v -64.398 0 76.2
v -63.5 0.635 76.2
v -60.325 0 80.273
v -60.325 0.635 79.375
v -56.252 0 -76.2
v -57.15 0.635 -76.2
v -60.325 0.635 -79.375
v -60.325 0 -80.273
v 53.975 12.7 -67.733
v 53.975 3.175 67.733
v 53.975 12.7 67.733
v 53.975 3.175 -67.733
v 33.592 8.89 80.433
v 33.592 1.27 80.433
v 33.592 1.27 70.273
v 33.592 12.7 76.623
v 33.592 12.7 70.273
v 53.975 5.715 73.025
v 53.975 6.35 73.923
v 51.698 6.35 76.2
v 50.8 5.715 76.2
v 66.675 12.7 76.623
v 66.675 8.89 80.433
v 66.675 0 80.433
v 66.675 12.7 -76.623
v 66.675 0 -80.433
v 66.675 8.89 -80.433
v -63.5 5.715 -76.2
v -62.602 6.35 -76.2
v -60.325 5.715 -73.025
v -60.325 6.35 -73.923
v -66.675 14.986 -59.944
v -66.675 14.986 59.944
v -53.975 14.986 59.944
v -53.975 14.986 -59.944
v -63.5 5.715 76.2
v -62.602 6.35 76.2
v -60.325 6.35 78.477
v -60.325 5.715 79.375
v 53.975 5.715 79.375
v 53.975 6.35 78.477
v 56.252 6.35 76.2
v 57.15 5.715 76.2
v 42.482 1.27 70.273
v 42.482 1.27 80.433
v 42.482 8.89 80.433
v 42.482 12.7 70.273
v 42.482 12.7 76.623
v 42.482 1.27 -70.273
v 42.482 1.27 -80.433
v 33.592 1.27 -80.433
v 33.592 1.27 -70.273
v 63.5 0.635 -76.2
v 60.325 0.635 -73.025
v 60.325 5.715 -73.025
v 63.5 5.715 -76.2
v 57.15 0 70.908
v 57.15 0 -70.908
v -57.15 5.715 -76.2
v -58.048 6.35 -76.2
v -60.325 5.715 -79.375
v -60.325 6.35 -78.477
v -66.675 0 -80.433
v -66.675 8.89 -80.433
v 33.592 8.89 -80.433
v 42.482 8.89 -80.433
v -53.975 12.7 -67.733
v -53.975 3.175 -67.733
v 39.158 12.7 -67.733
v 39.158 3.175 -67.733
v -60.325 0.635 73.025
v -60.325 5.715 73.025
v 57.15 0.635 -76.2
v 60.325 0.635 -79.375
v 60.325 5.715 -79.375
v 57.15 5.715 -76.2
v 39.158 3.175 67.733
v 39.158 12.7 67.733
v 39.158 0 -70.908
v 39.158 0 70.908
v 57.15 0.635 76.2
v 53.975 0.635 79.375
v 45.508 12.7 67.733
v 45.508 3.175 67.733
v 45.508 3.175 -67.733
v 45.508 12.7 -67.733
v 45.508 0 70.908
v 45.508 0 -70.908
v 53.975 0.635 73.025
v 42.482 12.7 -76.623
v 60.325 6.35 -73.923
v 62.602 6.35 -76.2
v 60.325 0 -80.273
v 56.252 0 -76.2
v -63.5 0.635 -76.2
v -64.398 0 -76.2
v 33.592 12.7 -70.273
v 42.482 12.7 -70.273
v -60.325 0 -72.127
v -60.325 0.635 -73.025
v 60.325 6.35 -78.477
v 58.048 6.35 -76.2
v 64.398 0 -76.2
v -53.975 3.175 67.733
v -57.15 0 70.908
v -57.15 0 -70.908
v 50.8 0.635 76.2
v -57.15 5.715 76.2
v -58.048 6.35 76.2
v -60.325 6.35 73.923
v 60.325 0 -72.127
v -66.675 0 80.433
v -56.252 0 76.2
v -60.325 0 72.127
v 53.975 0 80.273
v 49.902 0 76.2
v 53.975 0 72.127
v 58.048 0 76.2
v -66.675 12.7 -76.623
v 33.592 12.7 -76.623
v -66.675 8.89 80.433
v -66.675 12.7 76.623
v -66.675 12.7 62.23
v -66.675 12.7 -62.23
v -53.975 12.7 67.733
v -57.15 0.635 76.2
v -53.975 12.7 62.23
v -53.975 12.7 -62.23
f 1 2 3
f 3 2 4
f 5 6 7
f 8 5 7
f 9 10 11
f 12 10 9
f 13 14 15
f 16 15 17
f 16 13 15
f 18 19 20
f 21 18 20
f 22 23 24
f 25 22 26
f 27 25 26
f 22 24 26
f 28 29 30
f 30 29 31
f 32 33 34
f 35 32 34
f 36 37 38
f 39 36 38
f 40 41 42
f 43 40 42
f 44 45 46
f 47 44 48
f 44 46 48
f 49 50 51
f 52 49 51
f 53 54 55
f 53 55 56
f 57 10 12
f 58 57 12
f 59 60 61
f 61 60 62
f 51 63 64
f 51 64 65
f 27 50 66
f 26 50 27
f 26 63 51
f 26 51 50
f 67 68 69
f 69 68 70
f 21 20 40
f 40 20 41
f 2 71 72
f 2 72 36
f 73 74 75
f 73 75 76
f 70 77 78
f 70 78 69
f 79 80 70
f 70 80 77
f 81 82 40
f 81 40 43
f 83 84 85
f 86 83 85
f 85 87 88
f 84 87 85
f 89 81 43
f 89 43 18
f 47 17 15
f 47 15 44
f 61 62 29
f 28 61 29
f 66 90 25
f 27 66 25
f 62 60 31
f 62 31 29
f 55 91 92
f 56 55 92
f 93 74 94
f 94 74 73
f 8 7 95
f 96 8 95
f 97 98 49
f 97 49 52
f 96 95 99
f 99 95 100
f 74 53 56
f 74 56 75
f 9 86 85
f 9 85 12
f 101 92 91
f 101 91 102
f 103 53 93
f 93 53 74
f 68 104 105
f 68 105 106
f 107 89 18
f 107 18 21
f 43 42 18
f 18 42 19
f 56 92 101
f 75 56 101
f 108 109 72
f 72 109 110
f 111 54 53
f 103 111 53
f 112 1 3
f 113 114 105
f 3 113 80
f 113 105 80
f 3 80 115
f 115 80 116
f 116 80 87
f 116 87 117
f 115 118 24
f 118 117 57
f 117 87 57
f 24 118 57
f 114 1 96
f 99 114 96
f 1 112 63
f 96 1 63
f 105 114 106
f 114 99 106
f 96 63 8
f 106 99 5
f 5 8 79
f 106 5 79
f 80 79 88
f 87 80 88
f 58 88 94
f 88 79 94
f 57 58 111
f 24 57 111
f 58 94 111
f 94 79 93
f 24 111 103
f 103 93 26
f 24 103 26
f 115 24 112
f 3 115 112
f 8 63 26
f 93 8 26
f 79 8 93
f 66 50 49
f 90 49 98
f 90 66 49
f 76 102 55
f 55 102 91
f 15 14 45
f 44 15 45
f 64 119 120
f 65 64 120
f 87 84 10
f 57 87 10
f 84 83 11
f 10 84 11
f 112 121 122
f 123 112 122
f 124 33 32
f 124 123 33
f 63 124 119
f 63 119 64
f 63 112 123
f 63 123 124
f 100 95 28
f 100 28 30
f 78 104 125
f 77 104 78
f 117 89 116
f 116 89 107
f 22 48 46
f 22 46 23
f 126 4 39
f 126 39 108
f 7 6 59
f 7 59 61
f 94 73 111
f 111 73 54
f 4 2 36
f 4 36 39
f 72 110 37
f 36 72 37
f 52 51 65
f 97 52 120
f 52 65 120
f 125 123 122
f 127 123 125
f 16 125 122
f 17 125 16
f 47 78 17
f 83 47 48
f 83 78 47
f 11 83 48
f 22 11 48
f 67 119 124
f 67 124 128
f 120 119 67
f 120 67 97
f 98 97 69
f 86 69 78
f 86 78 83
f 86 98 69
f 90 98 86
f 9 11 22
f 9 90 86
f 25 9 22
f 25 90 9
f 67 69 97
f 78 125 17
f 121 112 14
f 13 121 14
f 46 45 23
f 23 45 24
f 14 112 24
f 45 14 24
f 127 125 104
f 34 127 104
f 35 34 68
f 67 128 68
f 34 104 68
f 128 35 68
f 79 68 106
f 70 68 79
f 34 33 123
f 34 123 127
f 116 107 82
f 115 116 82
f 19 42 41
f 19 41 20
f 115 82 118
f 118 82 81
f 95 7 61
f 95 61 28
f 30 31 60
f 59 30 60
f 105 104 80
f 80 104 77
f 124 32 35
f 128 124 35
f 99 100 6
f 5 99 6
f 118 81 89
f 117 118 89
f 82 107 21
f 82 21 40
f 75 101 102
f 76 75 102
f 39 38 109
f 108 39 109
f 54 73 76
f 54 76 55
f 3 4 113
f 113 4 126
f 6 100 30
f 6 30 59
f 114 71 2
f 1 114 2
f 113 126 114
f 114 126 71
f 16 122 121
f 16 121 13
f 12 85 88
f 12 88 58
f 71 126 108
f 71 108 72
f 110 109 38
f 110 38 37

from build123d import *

# Parameters (mm, degrees)
SKETCH2_W           = 133.35
SKETCH2_H           = 160.866666666
SKETCH2_W_2         = 93.133333333
SKETCH2_H_2         = 135.466666666
SKETCH2_W_3         = 8.466666667
BOSS_EXTRUDE1_DEPTH = 12.7
CUT_EXTRUDE1_DEPTH  = 6.35
CHAMFER4_SIZE       = 3.81
CHAMFER1_SIZE       = 0.635
CHAMFER2_SIZE       = 3.175
SKETCH4_W           = 8.89
SKETCH4_H           = 11.43
CUT_EXTRUDE2_DEPTH  = 10.16
SKETCH5_W           = 8.89
SKETCH5_H           = 11.43
CUT_EXTRUDE3_DEPTH  = 10.16
SKETCH6_W           = 12.7
SKETCH6_H           = 124.46
BOSS_EXTRUDE2_DEPTH = 2.286
CHAMFER5_SIZE       = 2.286


with BuildPart() as part:
    # Sketch2 → Boss-Extrude1 (new body)
    with BuildSketch(Plane(origin=(0, 0, 0), x_dir=(1, 0, 0), z_dir=(0, 1, 0))):
        Rectangle(SKETCH2_W, SKETCH2_H)
        with Locations((-7.408333333, 0)):
            Rectangle(SKETCH2_W_2, SKETCH2_H_2, mode=Mode.SUBTRACT)
        with Locations((49.741666667, 0)):
            Rectangle(SKETCH2_W_3, SKETCH2_H_2, mode=Mode.SUBTRACT)
    extrude(amount=BOSS_EXTRUDE1_DEPTH)

    # Sketch3 → Cut-Extrude1 (cut)
    with BuildSketch(Plane.XZ):
        Polygon((-57.15, 76.2), (-60.325, 73.025), (-63.5, 76.2), (-60.325, 79.375), align=None)
        Polygon((57.15, 76.2), (53.975, 73.025), (50.8, 76.2), (53.975, 79.375), align=None)
        Polygon((63.5, -76.2), (60.325, -79.375), (57.15, -76.2), (60.325, -73.025), align=None)
        Polygon((-57.15, -76.2), (-60.325, -79.375), (-63.5, -76.2), (-60.325, -73.025), align=None)
    extrude(amount=-CUT_EXTRUDE1_DEPTH, mode=Mode.SUBTRACT)

    # Chamfer4
    chamfer4_edges = [part.edges().sort_by_distance(p)[0] for p in [
        (0, 12.7, -80.433333333),
        (0, 12.7, 80.433333333),
    ]]
    chamfer(chamfer4_edges, length=CHAMFER4_SIZE)

    # Chamfer1
    chamfer1_edges = [part.edges().sort_by_distance(p)[0] for p in [
        (-58.7375, 6.35, -74.6125),
        (-58.7375, 6.35, -77.7875),
        (-61.9125, 6.35, -77.7875),
        (-61.9125, 6.35, -74.6125),
        (-58.7375, 0, -74.6125),
        (-61.9125, 0, -74.6125),
        (-61.9125, 0, -77.7875),
        (-58.7375, 0, -77.7875),
        (61.9125, 6.35, -74.6125),
        (61.9125, 6.35, -77.7875),
        (58.7375, 6.35, -77.7875),
        (58.7375, 6.35, -74.6125),
        (61.9125, 0, -74.6125),
        (58.7375, 0, -74.6125),
        (58.7375, 0, -77.7875),
        (61.9125, 0, -77.7875),
        (55.5625, 6.35, 77.7875),
        (55.5625, 6.35, 74.6125),
        (52.3875, 6.35, 74.6125),
        (52.3875, 6.35, 77.7875),
        (55.5625, 0, 77.7875),
        (52.3875, 0, 77.7875),
        (52.3875, 0, 74.6125),
        (55.5625, 0, 74.6125),
        (-58.7375, 6.35, 77.7875),
        (-58.7375, 6.35, 74.6125),
        (-61.9125, 6.35, 74.6125),
        (-61.9125, 6.35, 77.7875),
        (-58.7375, 0, 77.7875),
        (-61.9125, 0, 77.7875),
        (-61.9125, 0, 74.6125),
        (-58.7375, 0, 74.6125),
    ]]
    chamfer(chamfer1_edges, length=CHAMFER1_SIZE)

    # Chamfer2
    chamfer2_edges = [part.edges().sort_by_distance(p)[0] for p in [
        (53.975, 0, 0),
        (49.741666667, 0, -67.733333333),
        (49.741666667, 0, 67.733333333),
        (-7.408333333, 0, -67.733333333),
        (-53.975, 0, 0),
        (-7.408333333, 0, 67.733333333),
    ]]
    chamfer(chamfer2_edges, length=CHAMFER2_SIZE)

    # Sketch4 → Cut-Extrude2 (cut)
    with BuildSketch(Plane.XY.offset(80.433333333)):
        with Locations((38.0365, 6.985)):
            Rectangle(SKETCH4_W, SKETCH4_H)
    extrude(amount=-CUT_EXTRUDE2_DEPTH, mode=Mode.SUBTRACT)

    # Sketch5 → Cut-Extrude3 (cut)
    with BuildSketch(Plane(origin=(0, 0, -80.433333333), x_dir=(-1, 0, 0), z_dir=(0, 0, -1))):
        with Locations((-38.0365, 6.985)):
            Rectangle(SKETCH5_W, SKETCH5_H)
    extrude(amount=-CUT_EXTRUDE3_DEPTH, mode=Mode.SUBTRACT)

    # Sketch6 → Boss-Extrude2 (add)
    with BuildSketch(Plane(origin=(0, 12.7, 0), x_dir=(1, 0, 0), z_dir=(0, 1, 0))):
        with Locations((-60.325, 0)):
            Rectangle(SKETCH6_W, SKETCH6_H)
    extrude(amount=BOSS_EXTRUDE2_DEPTH)

    # Chamfer5
    chamfer5_edges = [part.edges().sort_by_distance(p)[0] for p in [
        (-60.325, 14.986, -62.23),
        (-60.325, 14.986, 62.23),
    ]]
    chamfer(chamfer5_edges, length=CHAMFER5_SIZE - 0.0001)  # a hair under: the kernel refuses the full size


solid = part.part
